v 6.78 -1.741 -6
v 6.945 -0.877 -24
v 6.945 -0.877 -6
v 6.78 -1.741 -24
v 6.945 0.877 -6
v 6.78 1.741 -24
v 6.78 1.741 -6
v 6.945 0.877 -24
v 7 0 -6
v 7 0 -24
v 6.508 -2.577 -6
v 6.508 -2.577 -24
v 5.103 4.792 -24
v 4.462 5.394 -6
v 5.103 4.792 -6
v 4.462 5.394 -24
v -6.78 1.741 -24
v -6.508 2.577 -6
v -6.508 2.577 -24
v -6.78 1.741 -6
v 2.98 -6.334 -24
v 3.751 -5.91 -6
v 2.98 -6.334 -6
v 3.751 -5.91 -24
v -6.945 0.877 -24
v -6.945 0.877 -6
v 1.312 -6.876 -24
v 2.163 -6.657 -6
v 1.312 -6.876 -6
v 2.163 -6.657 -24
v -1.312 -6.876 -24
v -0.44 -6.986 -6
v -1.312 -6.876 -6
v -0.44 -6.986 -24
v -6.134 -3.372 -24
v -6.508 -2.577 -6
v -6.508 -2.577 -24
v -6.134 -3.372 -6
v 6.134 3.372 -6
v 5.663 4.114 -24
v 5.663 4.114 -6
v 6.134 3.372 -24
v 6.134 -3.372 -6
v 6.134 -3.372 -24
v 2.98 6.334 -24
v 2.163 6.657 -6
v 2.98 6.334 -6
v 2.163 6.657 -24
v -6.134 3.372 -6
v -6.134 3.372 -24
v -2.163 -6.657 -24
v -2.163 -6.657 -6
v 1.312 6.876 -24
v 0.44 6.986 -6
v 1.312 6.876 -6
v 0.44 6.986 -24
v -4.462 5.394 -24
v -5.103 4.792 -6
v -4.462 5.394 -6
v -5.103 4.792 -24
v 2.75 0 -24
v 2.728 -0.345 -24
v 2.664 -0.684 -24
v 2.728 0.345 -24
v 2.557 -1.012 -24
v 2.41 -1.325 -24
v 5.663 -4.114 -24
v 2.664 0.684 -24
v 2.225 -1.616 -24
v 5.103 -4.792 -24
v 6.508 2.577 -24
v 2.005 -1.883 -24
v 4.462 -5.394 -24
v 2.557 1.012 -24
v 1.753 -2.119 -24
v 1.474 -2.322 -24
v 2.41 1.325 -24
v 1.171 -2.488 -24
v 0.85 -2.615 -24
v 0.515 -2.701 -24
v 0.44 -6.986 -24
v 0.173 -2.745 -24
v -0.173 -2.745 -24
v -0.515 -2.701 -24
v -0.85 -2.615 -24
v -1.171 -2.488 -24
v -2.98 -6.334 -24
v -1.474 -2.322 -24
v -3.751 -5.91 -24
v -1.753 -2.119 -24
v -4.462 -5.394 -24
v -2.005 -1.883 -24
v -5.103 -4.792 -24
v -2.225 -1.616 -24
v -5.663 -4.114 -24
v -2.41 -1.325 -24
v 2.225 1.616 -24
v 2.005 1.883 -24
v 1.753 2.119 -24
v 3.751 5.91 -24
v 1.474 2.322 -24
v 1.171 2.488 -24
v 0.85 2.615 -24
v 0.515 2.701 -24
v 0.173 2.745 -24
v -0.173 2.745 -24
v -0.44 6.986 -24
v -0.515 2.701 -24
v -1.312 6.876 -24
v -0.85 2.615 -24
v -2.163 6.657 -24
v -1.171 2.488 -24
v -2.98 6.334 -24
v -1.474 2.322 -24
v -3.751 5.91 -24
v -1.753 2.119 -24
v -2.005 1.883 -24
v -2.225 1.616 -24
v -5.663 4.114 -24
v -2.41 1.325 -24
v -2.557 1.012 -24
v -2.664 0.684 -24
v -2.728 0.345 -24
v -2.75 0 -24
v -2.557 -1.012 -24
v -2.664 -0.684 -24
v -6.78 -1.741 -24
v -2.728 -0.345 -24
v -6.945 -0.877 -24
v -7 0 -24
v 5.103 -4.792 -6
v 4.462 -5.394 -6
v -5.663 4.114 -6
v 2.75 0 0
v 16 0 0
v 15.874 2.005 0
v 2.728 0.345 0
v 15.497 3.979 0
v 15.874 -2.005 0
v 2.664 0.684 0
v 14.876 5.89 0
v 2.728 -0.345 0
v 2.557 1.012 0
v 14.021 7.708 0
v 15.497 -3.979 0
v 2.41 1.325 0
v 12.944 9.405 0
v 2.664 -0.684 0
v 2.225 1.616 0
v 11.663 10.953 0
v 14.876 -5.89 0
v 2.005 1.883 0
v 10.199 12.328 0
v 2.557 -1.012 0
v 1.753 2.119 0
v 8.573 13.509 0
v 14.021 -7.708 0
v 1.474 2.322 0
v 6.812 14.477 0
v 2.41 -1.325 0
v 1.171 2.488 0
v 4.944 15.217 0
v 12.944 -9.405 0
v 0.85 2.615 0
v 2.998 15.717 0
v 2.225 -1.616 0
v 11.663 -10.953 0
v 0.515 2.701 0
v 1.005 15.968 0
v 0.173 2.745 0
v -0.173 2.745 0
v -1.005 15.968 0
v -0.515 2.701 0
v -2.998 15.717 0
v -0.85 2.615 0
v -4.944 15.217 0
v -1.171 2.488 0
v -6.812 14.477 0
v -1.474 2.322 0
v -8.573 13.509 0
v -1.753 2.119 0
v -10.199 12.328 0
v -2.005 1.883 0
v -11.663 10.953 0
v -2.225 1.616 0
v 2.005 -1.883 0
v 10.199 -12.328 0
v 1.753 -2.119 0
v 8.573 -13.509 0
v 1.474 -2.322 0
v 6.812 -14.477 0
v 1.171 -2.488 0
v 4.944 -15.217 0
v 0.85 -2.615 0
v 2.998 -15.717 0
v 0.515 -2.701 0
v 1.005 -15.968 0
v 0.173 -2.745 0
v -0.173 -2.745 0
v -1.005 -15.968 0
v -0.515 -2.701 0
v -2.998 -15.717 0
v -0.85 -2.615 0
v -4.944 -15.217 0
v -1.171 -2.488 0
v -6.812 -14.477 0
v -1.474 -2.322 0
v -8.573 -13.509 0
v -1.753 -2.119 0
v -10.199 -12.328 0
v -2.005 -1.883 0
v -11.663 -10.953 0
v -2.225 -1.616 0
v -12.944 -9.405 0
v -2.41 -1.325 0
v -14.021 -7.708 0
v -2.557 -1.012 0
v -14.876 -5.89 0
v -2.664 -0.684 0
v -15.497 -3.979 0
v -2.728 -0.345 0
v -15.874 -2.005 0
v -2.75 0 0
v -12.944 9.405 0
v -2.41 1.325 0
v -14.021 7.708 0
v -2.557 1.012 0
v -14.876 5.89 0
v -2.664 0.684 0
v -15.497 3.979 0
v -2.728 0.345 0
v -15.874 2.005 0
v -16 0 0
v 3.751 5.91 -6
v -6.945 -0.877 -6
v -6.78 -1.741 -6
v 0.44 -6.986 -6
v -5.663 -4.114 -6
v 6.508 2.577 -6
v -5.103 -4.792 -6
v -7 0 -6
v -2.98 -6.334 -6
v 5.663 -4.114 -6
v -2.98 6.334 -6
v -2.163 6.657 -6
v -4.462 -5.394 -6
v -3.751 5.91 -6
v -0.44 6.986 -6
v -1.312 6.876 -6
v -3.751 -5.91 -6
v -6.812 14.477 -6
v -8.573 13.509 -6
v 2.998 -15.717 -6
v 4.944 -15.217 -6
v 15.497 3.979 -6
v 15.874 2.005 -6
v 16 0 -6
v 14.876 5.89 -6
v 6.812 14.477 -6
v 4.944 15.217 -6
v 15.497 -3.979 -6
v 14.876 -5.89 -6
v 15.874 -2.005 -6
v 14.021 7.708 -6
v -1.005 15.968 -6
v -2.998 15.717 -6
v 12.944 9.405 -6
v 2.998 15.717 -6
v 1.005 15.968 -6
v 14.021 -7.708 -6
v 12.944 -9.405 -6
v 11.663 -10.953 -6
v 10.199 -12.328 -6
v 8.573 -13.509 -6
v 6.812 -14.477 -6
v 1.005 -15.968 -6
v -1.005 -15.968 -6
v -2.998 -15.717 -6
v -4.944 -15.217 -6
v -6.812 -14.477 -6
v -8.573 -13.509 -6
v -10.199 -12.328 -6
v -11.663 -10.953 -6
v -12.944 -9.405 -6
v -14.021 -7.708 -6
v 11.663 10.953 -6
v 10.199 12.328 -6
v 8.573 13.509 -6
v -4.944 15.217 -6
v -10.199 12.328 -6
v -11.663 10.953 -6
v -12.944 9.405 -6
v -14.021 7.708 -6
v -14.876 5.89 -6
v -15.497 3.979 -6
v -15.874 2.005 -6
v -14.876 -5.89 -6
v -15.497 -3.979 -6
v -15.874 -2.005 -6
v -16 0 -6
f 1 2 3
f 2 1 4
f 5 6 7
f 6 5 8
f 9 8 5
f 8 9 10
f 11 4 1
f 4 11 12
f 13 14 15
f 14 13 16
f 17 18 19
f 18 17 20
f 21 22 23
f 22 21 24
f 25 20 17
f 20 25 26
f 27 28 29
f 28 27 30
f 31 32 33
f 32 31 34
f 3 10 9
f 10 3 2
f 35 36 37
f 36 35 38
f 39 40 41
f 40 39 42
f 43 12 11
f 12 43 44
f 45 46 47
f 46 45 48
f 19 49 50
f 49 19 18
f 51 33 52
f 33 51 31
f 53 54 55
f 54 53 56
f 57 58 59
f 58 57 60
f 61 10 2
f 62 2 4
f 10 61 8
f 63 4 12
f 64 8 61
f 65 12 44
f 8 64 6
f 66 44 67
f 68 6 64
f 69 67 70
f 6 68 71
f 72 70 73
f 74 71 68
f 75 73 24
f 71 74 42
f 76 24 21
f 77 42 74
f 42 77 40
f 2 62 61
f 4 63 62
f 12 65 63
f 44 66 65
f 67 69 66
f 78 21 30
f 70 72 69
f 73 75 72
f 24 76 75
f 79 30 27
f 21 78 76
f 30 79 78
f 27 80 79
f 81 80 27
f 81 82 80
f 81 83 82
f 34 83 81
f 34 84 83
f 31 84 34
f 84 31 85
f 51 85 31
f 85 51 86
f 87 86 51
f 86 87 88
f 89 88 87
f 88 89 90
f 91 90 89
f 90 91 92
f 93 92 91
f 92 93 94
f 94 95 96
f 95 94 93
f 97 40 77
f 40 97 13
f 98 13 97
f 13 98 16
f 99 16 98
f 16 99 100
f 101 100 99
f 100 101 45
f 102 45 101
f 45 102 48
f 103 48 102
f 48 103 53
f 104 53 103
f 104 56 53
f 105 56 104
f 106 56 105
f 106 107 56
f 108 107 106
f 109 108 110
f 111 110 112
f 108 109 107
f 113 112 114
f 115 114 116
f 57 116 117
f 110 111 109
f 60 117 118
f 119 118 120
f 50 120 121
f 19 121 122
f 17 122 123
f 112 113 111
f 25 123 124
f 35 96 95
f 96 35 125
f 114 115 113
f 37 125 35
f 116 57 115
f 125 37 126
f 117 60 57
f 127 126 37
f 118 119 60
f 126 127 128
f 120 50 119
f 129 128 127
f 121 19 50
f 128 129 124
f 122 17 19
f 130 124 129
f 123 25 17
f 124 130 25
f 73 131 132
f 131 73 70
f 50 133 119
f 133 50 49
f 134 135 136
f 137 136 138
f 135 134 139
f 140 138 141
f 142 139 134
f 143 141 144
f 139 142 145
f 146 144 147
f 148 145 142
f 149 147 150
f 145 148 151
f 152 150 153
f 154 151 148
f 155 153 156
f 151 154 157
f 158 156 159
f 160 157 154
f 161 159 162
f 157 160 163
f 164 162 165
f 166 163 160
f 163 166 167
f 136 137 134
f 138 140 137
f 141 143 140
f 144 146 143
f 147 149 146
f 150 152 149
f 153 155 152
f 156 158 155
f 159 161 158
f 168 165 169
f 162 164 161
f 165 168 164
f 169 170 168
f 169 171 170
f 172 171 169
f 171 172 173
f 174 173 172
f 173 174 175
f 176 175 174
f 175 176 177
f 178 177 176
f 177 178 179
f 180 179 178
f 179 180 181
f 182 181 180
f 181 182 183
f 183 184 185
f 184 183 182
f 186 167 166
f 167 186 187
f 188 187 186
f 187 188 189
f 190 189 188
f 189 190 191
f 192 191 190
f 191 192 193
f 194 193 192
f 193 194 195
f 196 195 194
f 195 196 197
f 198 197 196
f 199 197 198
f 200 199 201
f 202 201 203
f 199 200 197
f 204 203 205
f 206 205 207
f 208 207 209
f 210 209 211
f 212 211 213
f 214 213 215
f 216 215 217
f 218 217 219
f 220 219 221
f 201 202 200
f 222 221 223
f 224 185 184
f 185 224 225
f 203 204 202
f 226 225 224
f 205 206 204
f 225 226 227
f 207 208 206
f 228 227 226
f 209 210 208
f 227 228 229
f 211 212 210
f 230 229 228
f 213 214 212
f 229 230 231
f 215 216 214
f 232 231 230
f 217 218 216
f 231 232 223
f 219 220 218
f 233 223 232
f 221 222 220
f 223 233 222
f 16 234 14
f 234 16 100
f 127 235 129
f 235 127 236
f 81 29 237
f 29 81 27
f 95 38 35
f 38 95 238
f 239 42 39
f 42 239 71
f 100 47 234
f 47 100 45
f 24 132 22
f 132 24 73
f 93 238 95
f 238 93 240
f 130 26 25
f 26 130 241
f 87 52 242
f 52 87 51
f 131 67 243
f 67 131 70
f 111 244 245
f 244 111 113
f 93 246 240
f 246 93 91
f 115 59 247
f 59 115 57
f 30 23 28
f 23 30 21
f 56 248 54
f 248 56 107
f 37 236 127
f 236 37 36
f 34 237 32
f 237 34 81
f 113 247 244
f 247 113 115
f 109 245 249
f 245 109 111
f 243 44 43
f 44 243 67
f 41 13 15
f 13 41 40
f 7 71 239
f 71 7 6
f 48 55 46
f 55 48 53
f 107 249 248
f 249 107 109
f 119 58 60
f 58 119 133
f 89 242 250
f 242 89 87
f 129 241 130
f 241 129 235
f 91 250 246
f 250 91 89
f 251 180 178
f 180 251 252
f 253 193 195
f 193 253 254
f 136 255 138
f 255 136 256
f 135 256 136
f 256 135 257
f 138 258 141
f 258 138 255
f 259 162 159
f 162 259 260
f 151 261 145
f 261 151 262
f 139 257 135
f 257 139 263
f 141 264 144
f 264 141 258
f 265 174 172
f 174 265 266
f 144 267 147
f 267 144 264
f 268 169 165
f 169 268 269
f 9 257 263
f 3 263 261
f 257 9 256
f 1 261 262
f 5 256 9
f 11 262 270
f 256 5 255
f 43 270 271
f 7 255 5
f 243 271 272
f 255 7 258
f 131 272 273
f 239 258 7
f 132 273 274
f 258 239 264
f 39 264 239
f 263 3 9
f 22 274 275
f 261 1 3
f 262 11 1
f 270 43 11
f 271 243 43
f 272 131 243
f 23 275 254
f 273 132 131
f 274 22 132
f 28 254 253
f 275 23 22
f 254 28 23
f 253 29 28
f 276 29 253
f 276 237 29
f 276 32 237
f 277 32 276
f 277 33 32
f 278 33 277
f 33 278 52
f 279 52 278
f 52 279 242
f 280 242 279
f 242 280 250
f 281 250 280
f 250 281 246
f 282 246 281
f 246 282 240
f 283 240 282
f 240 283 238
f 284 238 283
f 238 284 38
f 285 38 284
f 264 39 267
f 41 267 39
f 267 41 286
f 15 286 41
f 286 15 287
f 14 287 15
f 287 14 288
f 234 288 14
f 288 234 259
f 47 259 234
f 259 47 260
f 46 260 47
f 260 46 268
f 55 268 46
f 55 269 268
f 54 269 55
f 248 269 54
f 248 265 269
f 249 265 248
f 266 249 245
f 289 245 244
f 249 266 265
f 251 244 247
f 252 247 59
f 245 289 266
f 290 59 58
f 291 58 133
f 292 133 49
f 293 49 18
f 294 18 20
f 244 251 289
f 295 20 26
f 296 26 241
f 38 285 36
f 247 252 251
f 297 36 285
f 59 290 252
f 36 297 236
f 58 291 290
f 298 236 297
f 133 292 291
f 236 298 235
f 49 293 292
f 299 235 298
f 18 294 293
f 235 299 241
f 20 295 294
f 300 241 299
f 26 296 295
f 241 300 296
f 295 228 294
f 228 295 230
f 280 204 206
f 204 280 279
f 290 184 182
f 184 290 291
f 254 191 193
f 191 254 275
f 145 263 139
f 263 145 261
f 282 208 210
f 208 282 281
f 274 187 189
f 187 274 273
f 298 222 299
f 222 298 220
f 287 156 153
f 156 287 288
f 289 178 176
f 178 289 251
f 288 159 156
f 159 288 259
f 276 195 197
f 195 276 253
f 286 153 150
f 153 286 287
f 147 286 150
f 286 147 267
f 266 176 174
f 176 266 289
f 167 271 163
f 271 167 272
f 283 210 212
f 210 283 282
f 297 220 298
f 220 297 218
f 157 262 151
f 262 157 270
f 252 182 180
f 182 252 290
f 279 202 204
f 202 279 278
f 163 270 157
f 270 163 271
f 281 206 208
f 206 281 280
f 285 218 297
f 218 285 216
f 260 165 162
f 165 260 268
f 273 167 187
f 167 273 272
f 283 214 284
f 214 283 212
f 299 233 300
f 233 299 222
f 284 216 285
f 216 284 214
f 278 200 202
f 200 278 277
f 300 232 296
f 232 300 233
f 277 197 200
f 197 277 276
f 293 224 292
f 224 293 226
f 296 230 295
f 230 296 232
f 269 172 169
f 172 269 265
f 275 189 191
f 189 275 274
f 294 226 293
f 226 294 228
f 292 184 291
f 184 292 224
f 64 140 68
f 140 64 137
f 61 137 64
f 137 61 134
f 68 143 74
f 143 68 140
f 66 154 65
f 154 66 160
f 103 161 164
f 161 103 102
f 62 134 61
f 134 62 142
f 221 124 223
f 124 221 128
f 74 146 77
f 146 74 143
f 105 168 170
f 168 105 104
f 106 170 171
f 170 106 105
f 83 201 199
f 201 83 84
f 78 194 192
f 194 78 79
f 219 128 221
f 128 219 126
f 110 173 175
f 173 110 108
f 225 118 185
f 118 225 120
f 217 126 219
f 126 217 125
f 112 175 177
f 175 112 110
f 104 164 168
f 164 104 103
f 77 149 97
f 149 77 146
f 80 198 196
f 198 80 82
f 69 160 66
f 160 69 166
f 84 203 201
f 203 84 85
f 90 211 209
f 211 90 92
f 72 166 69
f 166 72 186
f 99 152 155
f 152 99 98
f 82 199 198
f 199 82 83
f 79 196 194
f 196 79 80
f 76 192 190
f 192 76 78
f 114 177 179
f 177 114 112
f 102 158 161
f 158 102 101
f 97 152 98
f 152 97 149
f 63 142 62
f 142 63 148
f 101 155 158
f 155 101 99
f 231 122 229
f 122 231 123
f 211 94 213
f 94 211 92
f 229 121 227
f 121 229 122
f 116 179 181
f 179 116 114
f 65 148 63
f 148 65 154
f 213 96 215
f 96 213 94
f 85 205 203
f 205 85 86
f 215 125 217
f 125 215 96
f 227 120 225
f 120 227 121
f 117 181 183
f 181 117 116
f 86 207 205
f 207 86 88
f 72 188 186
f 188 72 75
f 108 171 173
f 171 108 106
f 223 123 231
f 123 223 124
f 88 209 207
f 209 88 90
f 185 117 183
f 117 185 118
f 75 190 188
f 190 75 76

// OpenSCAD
$fn = 50;


difference() {
	union() {
		translate(v = [0, 0, -24.0000000000]) {
			cylinder(h = 24, r = 7.0000000000);
		}
		translate(v = [0, 0, -6.0000000000]) {
			cylinder(h = 6, r = 16.0000000000);
		}
	}
	union() {
		#translate(v = [0, 0, -24]) {
			cylinder(h = 24, r = 2.7500000000);
		}
	}
}
